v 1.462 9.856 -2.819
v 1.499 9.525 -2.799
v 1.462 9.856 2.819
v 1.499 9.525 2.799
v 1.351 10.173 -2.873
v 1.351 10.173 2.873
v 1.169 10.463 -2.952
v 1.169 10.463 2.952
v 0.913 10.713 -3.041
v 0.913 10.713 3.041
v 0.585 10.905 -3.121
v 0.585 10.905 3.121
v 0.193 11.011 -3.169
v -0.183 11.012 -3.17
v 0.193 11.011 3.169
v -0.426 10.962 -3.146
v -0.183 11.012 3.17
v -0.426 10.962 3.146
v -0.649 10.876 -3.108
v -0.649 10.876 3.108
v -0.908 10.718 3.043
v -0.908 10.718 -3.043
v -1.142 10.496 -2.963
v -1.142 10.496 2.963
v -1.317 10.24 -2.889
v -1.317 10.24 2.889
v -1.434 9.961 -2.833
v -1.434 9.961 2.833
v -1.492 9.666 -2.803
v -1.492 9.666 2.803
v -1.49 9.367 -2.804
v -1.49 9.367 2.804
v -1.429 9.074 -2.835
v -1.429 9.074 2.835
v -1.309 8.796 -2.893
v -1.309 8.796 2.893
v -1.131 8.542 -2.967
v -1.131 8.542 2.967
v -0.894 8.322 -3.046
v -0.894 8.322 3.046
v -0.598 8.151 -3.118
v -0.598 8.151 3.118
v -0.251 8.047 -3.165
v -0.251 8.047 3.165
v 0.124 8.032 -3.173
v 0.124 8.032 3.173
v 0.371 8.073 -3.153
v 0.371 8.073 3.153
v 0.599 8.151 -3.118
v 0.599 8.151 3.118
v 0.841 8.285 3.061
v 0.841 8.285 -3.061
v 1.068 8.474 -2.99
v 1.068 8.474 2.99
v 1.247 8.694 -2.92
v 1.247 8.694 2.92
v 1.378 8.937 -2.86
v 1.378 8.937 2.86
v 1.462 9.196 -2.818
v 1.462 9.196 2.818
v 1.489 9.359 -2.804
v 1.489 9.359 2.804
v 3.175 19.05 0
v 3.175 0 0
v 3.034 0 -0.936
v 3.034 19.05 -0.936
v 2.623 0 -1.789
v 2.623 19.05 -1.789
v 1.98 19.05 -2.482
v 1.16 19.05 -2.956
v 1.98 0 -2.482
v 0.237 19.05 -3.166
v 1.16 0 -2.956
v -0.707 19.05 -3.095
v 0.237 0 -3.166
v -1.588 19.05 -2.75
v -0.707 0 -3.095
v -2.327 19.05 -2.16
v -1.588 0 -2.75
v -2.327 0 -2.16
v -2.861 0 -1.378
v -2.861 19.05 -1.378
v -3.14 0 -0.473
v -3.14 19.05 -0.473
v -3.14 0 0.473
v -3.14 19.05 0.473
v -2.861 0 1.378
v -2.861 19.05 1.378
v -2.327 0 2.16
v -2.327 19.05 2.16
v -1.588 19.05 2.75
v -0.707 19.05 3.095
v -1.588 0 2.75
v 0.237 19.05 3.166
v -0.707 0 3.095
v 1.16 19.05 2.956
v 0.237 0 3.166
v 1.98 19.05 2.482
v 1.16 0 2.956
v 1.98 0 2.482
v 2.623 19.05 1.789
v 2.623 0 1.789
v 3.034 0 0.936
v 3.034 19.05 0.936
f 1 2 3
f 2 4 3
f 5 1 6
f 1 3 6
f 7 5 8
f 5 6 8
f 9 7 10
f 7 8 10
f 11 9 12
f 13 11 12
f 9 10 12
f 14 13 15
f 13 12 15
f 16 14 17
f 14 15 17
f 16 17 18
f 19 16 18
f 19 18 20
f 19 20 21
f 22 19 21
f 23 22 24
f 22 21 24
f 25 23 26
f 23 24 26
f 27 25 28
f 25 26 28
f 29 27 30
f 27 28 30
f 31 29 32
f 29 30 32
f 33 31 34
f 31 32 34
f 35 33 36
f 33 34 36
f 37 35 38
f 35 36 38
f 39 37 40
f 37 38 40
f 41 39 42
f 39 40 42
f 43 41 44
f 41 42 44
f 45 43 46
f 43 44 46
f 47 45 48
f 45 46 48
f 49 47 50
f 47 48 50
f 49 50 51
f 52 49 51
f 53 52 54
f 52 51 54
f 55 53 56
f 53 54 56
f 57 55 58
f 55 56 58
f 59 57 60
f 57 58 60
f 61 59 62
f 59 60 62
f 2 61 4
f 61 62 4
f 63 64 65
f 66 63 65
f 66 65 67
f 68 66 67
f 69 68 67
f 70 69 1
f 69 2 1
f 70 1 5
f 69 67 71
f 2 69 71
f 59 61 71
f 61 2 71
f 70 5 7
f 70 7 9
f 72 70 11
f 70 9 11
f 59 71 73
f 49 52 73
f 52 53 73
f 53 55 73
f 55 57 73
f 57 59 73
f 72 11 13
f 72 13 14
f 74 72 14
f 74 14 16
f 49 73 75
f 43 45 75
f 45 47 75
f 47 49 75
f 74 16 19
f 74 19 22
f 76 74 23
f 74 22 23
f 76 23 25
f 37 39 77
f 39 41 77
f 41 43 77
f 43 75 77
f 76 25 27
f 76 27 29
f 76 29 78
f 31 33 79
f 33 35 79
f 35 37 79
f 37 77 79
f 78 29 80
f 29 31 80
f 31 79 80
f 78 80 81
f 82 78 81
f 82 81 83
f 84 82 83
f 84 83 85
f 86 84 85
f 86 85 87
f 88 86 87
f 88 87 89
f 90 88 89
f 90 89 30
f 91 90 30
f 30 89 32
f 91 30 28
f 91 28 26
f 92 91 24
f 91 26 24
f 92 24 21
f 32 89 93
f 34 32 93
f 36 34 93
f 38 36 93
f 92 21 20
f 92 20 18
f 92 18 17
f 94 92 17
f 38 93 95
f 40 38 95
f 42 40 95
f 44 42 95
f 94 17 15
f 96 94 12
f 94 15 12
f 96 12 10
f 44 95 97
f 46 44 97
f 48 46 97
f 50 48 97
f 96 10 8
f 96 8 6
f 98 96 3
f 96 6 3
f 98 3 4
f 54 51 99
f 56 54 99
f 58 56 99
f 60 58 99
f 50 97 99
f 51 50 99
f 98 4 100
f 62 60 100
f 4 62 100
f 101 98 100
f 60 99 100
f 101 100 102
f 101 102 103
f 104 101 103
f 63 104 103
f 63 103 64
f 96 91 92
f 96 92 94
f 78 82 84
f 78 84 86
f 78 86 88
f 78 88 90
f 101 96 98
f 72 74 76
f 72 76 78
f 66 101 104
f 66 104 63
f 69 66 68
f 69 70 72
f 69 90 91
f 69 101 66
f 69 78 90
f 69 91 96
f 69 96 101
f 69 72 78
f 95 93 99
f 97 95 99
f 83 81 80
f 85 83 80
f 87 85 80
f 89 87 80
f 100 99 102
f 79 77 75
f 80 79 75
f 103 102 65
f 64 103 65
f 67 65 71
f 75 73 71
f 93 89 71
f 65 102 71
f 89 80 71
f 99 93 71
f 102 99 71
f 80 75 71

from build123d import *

# Parameters (mm, degrees)
SKETCH1_R                      = 3.175
BOSS_EXTRUDE1_DEPTH            = 19.05
CUT_EXTRUDE1_REACH             = 21.572
CUT_EXTRUDE1_END_RADIUS        = 3.175
SKETCH2_R                      = 1.4986
CUT_EXTRUDE1_DIRECTION_2_DEPTH = 19.05


with BuildPart() as part:
    # Sketch1 → Boss-Extrude1 (new body)
    with BuildSketch(Plane(origin=(0, 0, 0), x_dir=(1, 0, 0), z_dir=(0, 1, 0))):
        Circle(SKETCH1_R)
    extrude(amount=BOSS_EXTRUDE1_DEPTH)

    # Cut-Extrude1: up to this cylinder (the profile starts inside it)
    cut_extrude1_end = Plane(origin=(0, 9.525, 0), z_dir=(0, -1, 0)) * Cylinder(CUT_EXTRUDE1_END_RADIUS, 50.494, mode=Mode.PRIVATE)
    # Sketch2 → Cut-Extrude1 (cut, up to the surface)
    with BuildSketch(Plane.XY, mode=Mode.PRIVATE) as cut_extrude1_sk1:
        with Locations((0, 9.525)):
            Circle(SKETCH2_R)
    cut_extrude1_tool1 = extrude(cut_extrude1_sk1.sketch, amount=-CUT_EXTRUDE1_REACH, mode=Mode.PRIVATE) & cut_extrude1_end
    add(cut_extrude1_tool1.solids().sort_by_distance((0, 9.525, 0))[0], mode=Mode.SUBTRACT)

    # Sketch2 → Cut-Extrude1 direction 2 (cut)
    with BuildSketch(Plane.XY):
        with Locations((0, 9.525)):
            Circle(SKETCH2_R)
    extrude(amount=CUT_EXTRUDE1_DIRECTION_2_DEPTH, mode=Mode.SUBTRACT)


solid = part.part
